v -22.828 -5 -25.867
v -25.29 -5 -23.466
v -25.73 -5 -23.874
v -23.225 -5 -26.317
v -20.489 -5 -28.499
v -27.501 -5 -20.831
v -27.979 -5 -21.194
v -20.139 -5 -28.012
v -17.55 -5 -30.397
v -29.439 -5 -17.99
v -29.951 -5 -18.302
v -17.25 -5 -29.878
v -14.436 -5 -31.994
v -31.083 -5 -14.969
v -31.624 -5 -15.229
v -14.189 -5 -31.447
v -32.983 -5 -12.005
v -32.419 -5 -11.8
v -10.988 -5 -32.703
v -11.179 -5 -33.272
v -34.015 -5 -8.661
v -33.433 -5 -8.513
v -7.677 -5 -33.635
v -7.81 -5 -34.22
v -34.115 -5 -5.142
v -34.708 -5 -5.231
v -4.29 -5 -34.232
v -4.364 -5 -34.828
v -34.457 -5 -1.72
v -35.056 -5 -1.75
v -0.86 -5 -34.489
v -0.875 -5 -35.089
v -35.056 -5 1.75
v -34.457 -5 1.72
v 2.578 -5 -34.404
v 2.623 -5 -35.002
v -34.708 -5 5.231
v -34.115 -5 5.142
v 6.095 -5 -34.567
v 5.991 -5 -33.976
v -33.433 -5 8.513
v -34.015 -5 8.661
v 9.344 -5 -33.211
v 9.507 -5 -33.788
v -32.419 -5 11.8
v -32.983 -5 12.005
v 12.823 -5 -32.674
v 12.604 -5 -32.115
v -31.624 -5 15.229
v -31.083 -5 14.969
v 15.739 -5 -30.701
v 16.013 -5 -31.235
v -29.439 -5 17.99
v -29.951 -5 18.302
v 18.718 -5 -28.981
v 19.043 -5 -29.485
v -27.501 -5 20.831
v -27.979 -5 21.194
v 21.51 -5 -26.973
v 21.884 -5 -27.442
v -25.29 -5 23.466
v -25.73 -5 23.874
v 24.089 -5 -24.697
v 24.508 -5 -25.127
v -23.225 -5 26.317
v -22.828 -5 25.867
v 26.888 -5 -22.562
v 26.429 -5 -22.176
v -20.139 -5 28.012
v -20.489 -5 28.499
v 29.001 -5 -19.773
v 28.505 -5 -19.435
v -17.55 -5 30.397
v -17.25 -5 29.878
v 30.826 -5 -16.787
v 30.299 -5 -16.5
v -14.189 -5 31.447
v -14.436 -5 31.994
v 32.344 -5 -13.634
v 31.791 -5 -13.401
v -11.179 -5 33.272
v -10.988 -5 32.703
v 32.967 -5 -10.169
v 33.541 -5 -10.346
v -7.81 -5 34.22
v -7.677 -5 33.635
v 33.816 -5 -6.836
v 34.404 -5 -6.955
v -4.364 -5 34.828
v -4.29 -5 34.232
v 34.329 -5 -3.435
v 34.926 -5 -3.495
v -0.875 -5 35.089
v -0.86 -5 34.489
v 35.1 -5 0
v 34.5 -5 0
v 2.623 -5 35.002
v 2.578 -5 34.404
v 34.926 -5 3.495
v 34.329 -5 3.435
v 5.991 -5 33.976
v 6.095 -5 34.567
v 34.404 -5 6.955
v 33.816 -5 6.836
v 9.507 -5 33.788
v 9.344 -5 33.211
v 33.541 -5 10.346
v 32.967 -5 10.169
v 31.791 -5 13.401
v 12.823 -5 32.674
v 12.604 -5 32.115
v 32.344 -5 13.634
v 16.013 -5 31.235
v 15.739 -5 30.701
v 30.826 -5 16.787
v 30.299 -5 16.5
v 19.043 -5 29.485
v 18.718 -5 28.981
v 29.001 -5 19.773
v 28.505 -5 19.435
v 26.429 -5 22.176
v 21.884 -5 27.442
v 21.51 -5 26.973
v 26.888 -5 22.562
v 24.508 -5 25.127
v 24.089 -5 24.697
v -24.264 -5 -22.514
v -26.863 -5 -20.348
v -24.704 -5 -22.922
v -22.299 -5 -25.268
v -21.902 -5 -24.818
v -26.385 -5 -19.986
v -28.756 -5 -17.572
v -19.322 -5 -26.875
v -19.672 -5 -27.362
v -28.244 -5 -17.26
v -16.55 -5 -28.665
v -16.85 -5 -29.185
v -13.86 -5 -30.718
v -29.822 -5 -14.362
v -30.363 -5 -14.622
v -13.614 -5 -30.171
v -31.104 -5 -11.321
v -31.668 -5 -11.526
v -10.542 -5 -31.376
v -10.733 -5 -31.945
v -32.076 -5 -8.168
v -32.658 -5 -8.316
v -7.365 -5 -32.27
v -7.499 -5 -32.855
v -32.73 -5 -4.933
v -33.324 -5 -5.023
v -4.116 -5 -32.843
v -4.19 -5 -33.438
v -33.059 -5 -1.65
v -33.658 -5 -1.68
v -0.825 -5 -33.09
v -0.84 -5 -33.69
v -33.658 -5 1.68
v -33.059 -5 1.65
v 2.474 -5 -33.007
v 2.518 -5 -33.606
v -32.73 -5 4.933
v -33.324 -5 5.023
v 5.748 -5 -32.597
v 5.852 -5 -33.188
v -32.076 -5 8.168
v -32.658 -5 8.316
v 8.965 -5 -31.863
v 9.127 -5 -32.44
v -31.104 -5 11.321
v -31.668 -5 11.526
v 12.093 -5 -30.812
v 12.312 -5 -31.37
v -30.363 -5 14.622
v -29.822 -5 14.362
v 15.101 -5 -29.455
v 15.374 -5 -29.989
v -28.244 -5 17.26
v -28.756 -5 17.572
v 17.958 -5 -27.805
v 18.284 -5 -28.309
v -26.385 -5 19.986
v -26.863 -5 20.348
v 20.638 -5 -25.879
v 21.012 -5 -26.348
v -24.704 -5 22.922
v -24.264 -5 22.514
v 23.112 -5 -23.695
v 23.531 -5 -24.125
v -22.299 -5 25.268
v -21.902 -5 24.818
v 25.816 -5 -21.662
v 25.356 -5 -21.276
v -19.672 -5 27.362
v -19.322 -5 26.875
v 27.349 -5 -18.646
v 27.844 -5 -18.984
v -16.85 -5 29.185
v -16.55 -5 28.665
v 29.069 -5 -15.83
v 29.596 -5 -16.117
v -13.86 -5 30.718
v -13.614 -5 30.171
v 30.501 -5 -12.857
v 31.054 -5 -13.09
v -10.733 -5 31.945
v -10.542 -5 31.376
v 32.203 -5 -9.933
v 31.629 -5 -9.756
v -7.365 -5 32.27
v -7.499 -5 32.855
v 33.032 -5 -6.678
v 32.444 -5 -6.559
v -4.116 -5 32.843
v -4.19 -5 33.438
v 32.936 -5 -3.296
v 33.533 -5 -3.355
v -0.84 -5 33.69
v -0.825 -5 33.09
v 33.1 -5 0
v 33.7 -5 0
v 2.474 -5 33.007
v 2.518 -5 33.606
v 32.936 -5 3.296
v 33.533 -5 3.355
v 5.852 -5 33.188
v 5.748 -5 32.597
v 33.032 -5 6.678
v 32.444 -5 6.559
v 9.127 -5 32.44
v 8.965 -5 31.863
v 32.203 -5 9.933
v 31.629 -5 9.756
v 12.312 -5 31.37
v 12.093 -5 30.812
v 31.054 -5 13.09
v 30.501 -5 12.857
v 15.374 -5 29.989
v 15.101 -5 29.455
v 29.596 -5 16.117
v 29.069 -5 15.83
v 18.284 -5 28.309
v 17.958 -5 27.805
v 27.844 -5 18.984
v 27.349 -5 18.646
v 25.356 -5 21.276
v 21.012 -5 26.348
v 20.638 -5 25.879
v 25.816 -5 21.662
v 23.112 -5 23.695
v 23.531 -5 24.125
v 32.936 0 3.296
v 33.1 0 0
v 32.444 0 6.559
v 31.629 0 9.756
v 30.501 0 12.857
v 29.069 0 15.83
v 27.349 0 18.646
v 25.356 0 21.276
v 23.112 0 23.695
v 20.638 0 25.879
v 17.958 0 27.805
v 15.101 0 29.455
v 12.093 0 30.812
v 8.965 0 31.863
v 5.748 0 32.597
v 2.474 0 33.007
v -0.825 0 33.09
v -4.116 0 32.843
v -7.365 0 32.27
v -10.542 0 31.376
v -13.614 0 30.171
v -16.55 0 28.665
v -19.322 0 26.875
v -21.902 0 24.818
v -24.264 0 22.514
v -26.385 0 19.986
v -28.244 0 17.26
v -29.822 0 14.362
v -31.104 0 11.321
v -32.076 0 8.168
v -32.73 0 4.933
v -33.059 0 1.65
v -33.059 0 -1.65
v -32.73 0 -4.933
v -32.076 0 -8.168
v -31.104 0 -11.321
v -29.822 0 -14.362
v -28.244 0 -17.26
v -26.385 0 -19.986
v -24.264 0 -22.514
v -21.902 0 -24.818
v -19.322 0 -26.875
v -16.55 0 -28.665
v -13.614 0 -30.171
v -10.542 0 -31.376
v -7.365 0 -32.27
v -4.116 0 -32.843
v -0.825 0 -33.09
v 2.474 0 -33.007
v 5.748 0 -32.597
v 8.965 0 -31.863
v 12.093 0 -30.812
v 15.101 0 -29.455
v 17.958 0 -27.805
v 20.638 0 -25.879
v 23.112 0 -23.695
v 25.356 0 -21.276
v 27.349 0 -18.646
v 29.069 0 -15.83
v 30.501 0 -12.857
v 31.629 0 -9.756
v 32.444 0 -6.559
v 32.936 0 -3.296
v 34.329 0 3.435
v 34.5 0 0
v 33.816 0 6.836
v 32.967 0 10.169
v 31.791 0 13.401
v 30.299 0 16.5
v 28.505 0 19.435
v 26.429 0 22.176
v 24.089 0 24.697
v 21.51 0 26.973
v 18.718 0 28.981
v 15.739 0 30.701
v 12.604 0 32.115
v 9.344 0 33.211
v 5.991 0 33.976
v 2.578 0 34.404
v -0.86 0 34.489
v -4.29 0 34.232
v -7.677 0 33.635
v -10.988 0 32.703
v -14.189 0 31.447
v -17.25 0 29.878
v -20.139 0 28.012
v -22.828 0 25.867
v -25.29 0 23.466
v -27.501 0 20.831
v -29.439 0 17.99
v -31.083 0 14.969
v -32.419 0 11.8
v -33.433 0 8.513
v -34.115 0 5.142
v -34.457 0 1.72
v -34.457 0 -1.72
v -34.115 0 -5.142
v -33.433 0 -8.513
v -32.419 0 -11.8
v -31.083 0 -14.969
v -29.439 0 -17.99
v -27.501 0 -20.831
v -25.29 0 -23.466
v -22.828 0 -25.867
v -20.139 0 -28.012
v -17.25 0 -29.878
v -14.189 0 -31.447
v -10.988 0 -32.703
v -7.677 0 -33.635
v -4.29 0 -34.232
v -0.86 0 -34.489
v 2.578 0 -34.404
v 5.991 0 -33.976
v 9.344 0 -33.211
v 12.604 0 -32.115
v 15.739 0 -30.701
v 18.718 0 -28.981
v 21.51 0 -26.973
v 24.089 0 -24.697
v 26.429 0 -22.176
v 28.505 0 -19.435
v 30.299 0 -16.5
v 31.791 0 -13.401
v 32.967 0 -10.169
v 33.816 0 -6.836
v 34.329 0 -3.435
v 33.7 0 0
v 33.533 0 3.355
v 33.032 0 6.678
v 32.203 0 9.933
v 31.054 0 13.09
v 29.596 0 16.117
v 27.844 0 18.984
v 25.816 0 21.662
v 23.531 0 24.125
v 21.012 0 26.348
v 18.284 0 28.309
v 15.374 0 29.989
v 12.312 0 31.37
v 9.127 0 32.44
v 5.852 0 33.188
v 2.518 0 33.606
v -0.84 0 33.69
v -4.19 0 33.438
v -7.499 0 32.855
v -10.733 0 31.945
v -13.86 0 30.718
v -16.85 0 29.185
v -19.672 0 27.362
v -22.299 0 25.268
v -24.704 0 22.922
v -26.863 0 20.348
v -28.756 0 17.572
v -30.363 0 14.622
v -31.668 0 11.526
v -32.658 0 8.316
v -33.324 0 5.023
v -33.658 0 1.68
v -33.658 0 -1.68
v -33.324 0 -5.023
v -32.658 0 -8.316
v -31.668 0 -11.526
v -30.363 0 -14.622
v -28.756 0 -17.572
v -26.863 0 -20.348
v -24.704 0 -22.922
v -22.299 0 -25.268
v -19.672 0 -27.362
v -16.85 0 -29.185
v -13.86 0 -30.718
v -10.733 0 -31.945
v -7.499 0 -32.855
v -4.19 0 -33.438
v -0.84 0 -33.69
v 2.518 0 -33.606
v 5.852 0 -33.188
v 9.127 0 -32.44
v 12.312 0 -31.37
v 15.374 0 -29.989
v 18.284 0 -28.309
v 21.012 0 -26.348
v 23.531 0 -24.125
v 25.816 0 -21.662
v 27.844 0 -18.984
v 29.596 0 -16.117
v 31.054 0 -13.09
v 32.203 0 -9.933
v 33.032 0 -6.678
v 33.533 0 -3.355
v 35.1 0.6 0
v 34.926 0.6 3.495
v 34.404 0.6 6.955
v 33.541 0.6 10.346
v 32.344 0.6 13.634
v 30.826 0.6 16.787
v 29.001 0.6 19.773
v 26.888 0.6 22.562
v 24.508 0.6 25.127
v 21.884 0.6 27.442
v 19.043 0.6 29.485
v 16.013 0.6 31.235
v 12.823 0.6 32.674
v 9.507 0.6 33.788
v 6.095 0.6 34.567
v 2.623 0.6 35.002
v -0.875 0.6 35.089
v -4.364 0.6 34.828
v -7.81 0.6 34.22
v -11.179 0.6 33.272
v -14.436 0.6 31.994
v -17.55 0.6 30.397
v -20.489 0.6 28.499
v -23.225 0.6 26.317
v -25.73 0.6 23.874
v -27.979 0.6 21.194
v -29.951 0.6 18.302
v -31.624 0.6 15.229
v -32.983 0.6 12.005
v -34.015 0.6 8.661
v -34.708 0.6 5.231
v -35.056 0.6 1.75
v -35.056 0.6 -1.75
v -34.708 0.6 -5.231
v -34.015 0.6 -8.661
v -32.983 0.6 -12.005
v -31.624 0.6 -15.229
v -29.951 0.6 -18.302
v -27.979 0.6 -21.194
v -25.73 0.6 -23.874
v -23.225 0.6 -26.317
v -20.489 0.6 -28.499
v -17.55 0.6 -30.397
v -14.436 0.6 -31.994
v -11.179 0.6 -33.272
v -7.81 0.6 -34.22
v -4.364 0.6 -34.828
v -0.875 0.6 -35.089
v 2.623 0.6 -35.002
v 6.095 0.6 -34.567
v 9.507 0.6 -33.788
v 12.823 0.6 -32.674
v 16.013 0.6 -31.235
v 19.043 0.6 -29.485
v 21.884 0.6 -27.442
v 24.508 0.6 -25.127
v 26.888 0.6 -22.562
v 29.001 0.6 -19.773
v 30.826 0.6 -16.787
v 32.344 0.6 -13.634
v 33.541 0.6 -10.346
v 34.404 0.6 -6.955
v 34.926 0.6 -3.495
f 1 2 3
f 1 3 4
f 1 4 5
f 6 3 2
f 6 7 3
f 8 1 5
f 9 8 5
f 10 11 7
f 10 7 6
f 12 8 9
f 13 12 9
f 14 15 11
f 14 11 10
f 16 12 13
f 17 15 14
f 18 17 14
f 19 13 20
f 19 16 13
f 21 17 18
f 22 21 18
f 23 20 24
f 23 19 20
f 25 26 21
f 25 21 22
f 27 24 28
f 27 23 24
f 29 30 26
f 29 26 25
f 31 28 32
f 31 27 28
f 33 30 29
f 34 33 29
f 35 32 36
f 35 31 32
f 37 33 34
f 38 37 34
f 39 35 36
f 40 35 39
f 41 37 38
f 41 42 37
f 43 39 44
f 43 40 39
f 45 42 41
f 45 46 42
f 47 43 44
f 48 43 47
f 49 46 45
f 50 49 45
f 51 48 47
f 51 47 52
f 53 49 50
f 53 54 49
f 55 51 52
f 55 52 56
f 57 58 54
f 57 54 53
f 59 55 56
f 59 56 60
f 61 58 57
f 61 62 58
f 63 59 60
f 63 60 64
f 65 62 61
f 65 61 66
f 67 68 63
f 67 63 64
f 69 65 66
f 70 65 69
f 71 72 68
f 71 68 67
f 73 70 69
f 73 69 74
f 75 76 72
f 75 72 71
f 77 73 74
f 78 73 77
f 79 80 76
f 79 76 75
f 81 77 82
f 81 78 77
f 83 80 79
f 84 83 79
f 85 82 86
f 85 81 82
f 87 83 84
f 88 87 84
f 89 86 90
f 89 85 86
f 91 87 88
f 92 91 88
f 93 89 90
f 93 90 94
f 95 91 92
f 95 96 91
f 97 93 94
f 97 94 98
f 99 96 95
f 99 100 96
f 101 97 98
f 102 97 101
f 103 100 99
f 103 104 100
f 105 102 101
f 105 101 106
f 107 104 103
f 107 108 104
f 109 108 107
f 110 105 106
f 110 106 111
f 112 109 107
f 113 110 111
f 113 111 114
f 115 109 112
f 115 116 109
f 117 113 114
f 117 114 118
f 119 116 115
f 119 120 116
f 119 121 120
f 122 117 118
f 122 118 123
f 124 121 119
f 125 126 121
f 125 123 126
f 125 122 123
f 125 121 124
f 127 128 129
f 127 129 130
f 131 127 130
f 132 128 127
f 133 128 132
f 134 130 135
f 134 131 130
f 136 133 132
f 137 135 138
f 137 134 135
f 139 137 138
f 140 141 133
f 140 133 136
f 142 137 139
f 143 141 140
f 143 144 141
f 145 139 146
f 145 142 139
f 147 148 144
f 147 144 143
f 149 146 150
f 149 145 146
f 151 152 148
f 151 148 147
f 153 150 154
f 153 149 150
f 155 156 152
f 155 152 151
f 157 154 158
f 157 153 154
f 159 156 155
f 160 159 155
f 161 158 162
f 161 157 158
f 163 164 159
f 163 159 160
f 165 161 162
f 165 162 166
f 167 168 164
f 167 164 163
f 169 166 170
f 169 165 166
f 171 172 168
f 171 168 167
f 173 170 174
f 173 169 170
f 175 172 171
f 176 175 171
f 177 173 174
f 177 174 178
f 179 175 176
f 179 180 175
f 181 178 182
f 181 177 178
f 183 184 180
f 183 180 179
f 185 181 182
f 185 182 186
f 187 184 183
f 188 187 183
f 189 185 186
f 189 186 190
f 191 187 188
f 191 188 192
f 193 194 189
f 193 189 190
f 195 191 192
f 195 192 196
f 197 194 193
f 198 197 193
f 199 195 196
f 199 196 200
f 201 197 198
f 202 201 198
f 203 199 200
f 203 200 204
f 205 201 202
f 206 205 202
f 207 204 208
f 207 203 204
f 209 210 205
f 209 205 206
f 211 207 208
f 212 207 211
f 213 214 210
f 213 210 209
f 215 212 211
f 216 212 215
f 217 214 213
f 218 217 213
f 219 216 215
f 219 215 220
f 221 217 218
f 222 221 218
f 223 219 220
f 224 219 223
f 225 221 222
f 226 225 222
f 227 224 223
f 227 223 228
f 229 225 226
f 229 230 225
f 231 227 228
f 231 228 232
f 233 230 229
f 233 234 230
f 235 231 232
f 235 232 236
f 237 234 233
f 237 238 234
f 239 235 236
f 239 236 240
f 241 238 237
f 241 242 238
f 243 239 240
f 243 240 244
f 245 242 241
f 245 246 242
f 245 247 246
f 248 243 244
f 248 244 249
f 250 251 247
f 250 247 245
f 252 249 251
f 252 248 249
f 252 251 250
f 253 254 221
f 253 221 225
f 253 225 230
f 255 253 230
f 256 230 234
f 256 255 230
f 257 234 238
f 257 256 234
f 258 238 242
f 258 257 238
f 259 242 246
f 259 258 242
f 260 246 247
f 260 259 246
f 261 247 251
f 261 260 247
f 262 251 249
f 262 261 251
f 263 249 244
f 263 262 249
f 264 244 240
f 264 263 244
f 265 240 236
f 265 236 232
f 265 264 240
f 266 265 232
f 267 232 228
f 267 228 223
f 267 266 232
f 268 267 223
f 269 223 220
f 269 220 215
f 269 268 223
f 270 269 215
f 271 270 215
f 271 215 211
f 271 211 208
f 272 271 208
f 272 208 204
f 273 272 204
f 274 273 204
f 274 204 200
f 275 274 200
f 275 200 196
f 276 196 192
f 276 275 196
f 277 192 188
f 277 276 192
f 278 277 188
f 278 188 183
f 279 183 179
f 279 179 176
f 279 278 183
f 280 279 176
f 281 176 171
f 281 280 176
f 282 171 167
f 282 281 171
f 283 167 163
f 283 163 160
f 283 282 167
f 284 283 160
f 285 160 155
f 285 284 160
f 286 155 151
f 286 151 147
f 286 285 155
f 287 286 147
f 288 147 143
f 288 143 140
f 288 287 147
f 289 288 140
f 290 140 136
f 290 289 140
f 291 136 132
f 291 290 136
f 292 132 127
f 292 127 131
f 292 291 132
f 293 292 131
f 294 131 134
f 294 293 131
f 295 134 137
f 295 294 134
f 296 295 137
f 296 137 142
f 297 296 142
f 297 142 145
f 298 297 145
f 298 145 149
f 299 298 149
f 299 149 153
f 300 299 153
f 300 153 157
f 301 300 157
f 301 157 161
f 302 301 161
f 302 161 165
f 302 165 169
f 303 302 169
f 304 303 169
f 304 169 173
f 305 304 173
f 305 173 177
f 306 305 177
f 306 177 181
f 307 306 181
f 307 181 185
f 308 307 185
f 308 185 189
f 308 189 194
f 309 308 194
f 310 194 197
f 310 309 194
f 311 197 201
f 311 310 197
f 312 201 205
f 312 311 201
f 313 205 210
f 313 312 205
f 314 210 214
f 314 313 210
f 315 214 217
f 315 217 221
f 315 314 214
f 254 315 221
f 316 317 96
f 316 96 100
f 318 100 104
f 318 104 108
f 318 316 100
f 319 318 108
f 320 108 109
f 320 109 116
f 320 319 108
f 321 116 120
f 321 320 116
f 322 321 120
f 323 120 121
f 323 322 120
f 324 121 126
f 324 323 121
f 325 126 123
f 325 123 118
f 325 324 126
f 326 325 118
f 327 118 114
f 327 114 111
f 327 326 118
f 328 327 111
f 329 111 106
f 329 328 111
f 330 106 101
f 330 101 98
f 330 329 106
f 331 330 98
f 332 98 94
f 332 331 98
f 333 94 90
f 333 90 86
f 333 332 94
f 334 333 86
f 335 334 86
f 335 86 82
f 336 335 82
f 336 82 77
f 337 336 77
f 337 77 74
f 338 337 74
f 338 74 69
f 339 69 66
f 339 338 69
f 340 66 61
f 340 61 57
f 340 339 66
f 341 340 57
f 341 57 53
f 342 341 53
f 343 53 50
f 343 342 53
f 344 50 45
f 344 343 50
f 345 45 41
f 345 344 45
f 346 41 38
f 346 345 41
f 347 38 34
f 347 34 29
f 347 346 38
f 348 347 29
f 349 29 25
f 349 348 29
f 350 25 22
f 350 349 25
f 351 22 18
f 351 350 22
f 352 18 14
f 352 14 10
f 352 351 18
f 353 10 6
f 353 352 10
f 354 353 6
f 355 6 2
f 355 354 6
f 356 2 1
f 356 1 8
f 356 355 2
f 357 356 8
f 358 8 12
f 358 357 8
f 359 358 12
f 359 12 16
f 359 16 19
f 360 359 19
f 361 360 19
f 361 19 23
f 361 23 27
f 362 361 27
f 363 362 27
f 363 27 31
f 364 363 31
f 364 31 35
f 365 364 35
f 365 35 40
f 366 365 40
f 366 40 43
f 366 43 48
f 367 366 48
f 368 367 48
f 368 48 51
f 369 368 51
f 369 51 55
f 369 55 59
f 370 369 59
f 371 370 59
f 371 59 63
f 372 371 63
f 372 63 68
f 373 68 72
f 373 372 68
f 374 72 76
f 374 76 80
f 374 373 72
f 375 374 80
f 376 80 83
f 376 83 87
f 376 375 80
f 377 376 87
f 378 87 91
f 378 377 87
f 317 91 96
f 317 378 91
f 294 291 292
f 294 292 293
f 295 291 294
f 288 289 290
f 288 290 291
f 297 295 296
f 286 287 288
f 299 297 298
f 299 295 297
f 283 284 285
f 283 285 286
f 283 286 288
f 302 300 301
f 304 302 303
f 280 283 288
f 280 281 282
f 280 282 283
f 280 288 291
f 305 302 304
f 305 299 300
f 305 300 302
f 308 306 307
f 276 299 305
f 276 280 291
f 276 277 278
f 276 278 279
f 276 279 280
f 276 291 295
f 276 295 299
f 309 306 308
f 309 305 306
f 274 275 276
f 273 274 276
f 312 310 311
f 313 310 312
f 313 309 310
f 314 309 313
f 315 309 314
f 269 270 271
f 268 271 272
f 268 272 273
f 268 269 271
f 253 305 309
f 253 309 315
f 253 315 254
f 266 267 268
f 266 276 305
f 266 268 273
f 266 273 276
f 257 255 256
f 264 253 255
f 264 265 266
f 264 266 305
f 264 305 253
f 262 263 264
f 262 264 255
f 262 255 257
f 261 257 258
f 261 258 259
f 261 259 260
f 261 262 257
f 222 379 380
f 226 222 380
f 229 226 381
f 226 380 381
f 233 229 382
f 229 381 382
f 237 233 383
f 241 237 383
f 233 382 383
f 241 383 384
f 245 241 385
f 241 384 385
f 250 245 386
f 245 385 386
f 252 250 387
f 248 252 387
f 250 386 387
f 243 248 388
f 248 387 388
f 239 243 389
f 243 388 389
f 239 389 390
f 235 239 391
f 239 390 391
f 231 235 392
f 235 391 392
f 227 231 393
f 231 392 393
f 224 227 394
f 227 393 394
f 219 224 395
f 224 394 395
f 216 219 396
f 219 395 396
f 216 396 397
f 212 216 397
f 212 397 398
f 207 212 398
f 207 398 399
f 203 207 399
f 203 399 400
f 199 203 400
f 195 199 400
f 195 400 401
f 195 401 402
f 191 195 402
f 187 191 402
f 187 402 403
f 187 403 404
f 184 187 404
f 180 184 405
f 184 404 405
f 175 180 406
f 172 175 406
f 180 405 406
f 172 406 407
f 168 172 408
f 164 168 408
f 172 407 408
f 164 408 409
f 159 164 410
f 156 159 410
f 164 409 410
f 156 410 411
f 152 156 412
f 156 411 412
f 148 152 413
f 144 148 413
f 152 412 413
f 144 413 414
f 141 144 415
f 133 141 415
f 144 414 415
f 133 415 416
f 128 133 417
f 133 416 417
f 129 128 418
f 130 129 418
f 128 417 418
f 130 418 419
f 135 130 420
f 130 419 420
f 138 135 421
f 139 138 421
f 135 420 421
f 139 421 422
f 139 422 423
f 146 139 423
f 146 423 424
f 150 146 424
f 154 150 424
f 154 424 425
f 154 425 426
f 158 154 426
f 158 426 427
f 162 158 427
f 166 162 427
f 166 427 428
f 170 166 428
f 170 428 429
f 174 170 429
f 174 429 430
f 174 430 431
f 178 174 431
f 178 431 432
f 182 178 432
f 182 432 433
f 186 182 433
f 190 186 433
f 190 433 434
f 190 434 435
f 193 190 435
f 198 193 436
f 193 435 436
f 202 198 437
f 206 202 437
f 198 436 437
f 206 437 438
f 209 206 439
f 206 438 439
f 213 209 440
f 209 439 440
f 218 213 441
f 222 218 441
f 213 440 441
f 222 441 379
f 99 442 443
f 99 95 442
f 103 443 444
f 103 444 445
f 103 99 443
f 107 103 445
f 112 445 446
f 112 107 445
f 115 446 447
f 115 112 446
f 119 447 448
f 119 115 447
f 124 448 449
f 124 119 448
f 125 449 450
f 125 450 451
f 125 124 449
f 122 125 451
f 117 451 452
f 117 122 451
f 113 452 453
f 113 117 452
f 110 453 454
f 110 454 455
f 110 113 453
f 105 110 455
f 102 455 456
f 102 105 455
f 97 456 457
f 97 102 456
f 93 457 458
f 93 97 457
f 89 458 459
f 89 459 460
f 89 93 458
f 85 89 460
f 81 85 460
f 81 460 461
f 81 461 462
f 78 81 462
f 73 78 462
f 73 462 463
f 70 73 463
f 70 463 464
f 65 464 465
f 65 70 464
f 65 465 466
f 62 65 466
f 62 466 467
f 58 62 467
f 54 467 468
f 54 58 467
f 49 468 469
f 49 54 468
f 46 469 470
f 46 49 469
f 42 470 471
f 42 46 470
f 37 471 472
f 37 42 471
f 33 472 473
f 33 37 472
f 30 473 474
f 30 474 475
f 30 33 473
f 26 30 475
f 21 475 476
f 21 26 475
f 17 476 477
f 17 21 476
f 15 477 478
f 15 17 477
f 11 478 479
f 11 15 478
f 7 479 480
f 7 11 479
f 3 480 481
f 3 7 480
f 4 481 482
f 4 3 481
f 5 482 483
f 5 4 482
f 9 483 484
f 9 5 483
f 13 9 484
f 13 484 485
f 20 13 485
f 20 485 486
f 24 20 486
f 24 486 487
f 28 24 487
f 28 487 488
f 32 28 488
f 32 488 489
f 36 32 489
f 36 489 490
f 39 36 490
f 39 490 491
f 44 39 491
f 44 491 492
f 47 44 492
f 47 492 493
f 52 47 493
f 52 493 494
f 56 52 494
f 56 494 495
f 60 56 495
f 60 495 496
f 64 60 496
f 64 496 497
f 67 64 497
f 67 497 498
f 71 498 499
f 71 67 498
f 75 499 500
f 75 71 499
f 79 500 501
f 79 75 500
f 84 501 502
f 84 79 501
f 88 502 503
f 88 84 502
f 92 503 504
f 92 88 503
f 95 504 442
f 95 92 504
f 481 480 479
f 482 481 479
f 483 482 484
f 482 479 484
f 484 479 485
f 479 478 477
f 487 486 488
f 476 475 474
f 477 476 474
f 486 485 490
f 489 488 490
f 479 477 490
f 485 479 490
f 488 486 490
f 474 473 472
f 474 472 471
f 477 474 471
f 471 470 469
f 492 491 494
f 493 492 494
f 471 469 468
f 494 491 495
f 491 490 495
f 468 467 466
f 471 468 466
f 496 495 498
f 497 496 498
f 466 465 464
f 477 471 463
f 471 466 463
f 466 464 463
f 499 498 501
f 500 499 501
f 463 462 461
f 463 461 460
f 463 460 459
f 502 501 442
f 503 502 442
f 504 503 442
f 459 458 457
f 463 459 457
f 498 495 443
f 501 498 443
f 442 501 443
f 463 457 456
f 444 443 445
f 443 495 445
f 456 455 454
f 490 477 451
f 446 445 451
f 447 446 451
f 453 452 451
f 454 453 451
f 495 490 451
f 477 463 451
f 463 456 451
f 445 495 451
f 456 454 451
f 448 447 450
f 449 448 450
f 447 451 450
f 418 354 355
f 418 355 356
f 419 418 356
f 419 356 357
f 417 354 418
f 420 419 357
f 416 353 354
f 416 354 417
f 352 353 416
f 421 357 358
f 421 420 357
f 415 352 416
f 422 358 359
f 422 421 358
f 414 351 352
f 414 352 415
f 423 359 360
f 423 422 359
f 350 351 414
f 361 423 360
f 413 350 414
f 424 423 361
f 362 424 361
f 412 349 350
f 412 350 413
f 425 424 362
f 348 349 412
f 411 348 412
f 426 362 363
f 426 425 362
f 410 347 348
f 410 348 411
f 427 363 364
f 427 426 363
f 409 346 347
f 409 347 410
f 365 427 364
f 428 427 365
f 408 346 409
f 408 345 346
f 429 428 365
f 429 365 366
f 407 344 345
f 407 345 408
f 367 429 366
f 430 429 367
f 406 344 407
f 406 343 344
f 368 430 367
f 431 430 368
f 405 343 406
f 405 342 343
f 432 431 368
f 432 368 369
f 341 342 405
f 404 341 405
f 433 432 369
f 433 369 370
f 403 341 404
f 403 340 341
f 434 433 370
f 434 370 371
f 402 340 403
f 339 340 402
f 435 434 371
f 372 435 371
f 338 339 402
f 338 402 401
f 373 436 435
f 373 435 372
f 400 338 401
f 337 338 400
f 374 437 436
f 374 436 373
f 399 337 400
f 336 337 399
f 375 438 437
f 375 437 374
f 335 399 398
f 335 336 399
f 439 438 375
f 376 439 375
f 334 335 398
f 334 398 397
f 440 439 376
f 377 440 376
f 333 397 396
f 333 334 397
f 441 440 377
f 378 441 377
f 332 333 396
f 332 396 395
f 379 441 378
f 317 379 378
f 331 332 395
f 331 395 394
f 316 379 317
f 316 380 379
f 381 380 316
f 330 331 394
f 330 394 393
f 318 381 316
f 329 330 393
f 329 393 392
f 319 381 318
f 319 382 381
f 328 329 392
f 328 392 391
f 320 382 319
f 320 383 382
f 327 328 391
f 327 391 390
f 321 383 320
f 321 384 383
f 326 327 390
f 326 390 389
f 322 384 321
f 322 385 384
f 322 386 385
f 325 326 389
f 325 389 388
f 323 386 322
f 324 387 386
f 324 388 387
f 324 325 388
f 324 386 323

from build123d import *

# Parameters (mm, degrees)
F0_R     = 35.1
F0_R_2   = 34.5
F1_DEPTH = 5
F0_R_3   = 33.6999967694
F0_R_4   = 33.0999977887
F2_DEPTH = 0.6


with BuildPart() as f1:
    # F0 (on Front) → F1 (new body)
    with BuildSketch(Plane.XZ):
        Circle(F0_R)
        Circle(F0_R_2, mode=Mode.SUBTRACT)
    extrude(amount=F1_DEPTH)



with BuildPart() as f1b:
    # F0 (on Front) → F1, piece 2 (new body)
    with BuildSketch(Plane.XZ):
        Circle(F0_R_3)
        Circle(F0_R_4, mode=Mode.SUBTRACT)
    extrude(amount=F1_DEPTH)


with BuildPart() as f1_1:
    add(f1.part)

    add(f1b.part)  # F2 merges F1b
    # F0 (on Front) → F2 (join)
    with BuildSketch(Plane.XZ):
        Circle(F0_R)
        Circle(F0_R_2, mode=Mode.SUBTRACT)
        Circle(F0_R_2)
        Circle(F0_R_3, mode=Mode.SUBTRACT)
        Circle(F0_R_3)
        Circle(F0_R_4, mode=Mode.SUBTRACT)
        Circle(F0_R_4)
    extrude(amount=-F2_DEPTH)


solid = f1_1.part
